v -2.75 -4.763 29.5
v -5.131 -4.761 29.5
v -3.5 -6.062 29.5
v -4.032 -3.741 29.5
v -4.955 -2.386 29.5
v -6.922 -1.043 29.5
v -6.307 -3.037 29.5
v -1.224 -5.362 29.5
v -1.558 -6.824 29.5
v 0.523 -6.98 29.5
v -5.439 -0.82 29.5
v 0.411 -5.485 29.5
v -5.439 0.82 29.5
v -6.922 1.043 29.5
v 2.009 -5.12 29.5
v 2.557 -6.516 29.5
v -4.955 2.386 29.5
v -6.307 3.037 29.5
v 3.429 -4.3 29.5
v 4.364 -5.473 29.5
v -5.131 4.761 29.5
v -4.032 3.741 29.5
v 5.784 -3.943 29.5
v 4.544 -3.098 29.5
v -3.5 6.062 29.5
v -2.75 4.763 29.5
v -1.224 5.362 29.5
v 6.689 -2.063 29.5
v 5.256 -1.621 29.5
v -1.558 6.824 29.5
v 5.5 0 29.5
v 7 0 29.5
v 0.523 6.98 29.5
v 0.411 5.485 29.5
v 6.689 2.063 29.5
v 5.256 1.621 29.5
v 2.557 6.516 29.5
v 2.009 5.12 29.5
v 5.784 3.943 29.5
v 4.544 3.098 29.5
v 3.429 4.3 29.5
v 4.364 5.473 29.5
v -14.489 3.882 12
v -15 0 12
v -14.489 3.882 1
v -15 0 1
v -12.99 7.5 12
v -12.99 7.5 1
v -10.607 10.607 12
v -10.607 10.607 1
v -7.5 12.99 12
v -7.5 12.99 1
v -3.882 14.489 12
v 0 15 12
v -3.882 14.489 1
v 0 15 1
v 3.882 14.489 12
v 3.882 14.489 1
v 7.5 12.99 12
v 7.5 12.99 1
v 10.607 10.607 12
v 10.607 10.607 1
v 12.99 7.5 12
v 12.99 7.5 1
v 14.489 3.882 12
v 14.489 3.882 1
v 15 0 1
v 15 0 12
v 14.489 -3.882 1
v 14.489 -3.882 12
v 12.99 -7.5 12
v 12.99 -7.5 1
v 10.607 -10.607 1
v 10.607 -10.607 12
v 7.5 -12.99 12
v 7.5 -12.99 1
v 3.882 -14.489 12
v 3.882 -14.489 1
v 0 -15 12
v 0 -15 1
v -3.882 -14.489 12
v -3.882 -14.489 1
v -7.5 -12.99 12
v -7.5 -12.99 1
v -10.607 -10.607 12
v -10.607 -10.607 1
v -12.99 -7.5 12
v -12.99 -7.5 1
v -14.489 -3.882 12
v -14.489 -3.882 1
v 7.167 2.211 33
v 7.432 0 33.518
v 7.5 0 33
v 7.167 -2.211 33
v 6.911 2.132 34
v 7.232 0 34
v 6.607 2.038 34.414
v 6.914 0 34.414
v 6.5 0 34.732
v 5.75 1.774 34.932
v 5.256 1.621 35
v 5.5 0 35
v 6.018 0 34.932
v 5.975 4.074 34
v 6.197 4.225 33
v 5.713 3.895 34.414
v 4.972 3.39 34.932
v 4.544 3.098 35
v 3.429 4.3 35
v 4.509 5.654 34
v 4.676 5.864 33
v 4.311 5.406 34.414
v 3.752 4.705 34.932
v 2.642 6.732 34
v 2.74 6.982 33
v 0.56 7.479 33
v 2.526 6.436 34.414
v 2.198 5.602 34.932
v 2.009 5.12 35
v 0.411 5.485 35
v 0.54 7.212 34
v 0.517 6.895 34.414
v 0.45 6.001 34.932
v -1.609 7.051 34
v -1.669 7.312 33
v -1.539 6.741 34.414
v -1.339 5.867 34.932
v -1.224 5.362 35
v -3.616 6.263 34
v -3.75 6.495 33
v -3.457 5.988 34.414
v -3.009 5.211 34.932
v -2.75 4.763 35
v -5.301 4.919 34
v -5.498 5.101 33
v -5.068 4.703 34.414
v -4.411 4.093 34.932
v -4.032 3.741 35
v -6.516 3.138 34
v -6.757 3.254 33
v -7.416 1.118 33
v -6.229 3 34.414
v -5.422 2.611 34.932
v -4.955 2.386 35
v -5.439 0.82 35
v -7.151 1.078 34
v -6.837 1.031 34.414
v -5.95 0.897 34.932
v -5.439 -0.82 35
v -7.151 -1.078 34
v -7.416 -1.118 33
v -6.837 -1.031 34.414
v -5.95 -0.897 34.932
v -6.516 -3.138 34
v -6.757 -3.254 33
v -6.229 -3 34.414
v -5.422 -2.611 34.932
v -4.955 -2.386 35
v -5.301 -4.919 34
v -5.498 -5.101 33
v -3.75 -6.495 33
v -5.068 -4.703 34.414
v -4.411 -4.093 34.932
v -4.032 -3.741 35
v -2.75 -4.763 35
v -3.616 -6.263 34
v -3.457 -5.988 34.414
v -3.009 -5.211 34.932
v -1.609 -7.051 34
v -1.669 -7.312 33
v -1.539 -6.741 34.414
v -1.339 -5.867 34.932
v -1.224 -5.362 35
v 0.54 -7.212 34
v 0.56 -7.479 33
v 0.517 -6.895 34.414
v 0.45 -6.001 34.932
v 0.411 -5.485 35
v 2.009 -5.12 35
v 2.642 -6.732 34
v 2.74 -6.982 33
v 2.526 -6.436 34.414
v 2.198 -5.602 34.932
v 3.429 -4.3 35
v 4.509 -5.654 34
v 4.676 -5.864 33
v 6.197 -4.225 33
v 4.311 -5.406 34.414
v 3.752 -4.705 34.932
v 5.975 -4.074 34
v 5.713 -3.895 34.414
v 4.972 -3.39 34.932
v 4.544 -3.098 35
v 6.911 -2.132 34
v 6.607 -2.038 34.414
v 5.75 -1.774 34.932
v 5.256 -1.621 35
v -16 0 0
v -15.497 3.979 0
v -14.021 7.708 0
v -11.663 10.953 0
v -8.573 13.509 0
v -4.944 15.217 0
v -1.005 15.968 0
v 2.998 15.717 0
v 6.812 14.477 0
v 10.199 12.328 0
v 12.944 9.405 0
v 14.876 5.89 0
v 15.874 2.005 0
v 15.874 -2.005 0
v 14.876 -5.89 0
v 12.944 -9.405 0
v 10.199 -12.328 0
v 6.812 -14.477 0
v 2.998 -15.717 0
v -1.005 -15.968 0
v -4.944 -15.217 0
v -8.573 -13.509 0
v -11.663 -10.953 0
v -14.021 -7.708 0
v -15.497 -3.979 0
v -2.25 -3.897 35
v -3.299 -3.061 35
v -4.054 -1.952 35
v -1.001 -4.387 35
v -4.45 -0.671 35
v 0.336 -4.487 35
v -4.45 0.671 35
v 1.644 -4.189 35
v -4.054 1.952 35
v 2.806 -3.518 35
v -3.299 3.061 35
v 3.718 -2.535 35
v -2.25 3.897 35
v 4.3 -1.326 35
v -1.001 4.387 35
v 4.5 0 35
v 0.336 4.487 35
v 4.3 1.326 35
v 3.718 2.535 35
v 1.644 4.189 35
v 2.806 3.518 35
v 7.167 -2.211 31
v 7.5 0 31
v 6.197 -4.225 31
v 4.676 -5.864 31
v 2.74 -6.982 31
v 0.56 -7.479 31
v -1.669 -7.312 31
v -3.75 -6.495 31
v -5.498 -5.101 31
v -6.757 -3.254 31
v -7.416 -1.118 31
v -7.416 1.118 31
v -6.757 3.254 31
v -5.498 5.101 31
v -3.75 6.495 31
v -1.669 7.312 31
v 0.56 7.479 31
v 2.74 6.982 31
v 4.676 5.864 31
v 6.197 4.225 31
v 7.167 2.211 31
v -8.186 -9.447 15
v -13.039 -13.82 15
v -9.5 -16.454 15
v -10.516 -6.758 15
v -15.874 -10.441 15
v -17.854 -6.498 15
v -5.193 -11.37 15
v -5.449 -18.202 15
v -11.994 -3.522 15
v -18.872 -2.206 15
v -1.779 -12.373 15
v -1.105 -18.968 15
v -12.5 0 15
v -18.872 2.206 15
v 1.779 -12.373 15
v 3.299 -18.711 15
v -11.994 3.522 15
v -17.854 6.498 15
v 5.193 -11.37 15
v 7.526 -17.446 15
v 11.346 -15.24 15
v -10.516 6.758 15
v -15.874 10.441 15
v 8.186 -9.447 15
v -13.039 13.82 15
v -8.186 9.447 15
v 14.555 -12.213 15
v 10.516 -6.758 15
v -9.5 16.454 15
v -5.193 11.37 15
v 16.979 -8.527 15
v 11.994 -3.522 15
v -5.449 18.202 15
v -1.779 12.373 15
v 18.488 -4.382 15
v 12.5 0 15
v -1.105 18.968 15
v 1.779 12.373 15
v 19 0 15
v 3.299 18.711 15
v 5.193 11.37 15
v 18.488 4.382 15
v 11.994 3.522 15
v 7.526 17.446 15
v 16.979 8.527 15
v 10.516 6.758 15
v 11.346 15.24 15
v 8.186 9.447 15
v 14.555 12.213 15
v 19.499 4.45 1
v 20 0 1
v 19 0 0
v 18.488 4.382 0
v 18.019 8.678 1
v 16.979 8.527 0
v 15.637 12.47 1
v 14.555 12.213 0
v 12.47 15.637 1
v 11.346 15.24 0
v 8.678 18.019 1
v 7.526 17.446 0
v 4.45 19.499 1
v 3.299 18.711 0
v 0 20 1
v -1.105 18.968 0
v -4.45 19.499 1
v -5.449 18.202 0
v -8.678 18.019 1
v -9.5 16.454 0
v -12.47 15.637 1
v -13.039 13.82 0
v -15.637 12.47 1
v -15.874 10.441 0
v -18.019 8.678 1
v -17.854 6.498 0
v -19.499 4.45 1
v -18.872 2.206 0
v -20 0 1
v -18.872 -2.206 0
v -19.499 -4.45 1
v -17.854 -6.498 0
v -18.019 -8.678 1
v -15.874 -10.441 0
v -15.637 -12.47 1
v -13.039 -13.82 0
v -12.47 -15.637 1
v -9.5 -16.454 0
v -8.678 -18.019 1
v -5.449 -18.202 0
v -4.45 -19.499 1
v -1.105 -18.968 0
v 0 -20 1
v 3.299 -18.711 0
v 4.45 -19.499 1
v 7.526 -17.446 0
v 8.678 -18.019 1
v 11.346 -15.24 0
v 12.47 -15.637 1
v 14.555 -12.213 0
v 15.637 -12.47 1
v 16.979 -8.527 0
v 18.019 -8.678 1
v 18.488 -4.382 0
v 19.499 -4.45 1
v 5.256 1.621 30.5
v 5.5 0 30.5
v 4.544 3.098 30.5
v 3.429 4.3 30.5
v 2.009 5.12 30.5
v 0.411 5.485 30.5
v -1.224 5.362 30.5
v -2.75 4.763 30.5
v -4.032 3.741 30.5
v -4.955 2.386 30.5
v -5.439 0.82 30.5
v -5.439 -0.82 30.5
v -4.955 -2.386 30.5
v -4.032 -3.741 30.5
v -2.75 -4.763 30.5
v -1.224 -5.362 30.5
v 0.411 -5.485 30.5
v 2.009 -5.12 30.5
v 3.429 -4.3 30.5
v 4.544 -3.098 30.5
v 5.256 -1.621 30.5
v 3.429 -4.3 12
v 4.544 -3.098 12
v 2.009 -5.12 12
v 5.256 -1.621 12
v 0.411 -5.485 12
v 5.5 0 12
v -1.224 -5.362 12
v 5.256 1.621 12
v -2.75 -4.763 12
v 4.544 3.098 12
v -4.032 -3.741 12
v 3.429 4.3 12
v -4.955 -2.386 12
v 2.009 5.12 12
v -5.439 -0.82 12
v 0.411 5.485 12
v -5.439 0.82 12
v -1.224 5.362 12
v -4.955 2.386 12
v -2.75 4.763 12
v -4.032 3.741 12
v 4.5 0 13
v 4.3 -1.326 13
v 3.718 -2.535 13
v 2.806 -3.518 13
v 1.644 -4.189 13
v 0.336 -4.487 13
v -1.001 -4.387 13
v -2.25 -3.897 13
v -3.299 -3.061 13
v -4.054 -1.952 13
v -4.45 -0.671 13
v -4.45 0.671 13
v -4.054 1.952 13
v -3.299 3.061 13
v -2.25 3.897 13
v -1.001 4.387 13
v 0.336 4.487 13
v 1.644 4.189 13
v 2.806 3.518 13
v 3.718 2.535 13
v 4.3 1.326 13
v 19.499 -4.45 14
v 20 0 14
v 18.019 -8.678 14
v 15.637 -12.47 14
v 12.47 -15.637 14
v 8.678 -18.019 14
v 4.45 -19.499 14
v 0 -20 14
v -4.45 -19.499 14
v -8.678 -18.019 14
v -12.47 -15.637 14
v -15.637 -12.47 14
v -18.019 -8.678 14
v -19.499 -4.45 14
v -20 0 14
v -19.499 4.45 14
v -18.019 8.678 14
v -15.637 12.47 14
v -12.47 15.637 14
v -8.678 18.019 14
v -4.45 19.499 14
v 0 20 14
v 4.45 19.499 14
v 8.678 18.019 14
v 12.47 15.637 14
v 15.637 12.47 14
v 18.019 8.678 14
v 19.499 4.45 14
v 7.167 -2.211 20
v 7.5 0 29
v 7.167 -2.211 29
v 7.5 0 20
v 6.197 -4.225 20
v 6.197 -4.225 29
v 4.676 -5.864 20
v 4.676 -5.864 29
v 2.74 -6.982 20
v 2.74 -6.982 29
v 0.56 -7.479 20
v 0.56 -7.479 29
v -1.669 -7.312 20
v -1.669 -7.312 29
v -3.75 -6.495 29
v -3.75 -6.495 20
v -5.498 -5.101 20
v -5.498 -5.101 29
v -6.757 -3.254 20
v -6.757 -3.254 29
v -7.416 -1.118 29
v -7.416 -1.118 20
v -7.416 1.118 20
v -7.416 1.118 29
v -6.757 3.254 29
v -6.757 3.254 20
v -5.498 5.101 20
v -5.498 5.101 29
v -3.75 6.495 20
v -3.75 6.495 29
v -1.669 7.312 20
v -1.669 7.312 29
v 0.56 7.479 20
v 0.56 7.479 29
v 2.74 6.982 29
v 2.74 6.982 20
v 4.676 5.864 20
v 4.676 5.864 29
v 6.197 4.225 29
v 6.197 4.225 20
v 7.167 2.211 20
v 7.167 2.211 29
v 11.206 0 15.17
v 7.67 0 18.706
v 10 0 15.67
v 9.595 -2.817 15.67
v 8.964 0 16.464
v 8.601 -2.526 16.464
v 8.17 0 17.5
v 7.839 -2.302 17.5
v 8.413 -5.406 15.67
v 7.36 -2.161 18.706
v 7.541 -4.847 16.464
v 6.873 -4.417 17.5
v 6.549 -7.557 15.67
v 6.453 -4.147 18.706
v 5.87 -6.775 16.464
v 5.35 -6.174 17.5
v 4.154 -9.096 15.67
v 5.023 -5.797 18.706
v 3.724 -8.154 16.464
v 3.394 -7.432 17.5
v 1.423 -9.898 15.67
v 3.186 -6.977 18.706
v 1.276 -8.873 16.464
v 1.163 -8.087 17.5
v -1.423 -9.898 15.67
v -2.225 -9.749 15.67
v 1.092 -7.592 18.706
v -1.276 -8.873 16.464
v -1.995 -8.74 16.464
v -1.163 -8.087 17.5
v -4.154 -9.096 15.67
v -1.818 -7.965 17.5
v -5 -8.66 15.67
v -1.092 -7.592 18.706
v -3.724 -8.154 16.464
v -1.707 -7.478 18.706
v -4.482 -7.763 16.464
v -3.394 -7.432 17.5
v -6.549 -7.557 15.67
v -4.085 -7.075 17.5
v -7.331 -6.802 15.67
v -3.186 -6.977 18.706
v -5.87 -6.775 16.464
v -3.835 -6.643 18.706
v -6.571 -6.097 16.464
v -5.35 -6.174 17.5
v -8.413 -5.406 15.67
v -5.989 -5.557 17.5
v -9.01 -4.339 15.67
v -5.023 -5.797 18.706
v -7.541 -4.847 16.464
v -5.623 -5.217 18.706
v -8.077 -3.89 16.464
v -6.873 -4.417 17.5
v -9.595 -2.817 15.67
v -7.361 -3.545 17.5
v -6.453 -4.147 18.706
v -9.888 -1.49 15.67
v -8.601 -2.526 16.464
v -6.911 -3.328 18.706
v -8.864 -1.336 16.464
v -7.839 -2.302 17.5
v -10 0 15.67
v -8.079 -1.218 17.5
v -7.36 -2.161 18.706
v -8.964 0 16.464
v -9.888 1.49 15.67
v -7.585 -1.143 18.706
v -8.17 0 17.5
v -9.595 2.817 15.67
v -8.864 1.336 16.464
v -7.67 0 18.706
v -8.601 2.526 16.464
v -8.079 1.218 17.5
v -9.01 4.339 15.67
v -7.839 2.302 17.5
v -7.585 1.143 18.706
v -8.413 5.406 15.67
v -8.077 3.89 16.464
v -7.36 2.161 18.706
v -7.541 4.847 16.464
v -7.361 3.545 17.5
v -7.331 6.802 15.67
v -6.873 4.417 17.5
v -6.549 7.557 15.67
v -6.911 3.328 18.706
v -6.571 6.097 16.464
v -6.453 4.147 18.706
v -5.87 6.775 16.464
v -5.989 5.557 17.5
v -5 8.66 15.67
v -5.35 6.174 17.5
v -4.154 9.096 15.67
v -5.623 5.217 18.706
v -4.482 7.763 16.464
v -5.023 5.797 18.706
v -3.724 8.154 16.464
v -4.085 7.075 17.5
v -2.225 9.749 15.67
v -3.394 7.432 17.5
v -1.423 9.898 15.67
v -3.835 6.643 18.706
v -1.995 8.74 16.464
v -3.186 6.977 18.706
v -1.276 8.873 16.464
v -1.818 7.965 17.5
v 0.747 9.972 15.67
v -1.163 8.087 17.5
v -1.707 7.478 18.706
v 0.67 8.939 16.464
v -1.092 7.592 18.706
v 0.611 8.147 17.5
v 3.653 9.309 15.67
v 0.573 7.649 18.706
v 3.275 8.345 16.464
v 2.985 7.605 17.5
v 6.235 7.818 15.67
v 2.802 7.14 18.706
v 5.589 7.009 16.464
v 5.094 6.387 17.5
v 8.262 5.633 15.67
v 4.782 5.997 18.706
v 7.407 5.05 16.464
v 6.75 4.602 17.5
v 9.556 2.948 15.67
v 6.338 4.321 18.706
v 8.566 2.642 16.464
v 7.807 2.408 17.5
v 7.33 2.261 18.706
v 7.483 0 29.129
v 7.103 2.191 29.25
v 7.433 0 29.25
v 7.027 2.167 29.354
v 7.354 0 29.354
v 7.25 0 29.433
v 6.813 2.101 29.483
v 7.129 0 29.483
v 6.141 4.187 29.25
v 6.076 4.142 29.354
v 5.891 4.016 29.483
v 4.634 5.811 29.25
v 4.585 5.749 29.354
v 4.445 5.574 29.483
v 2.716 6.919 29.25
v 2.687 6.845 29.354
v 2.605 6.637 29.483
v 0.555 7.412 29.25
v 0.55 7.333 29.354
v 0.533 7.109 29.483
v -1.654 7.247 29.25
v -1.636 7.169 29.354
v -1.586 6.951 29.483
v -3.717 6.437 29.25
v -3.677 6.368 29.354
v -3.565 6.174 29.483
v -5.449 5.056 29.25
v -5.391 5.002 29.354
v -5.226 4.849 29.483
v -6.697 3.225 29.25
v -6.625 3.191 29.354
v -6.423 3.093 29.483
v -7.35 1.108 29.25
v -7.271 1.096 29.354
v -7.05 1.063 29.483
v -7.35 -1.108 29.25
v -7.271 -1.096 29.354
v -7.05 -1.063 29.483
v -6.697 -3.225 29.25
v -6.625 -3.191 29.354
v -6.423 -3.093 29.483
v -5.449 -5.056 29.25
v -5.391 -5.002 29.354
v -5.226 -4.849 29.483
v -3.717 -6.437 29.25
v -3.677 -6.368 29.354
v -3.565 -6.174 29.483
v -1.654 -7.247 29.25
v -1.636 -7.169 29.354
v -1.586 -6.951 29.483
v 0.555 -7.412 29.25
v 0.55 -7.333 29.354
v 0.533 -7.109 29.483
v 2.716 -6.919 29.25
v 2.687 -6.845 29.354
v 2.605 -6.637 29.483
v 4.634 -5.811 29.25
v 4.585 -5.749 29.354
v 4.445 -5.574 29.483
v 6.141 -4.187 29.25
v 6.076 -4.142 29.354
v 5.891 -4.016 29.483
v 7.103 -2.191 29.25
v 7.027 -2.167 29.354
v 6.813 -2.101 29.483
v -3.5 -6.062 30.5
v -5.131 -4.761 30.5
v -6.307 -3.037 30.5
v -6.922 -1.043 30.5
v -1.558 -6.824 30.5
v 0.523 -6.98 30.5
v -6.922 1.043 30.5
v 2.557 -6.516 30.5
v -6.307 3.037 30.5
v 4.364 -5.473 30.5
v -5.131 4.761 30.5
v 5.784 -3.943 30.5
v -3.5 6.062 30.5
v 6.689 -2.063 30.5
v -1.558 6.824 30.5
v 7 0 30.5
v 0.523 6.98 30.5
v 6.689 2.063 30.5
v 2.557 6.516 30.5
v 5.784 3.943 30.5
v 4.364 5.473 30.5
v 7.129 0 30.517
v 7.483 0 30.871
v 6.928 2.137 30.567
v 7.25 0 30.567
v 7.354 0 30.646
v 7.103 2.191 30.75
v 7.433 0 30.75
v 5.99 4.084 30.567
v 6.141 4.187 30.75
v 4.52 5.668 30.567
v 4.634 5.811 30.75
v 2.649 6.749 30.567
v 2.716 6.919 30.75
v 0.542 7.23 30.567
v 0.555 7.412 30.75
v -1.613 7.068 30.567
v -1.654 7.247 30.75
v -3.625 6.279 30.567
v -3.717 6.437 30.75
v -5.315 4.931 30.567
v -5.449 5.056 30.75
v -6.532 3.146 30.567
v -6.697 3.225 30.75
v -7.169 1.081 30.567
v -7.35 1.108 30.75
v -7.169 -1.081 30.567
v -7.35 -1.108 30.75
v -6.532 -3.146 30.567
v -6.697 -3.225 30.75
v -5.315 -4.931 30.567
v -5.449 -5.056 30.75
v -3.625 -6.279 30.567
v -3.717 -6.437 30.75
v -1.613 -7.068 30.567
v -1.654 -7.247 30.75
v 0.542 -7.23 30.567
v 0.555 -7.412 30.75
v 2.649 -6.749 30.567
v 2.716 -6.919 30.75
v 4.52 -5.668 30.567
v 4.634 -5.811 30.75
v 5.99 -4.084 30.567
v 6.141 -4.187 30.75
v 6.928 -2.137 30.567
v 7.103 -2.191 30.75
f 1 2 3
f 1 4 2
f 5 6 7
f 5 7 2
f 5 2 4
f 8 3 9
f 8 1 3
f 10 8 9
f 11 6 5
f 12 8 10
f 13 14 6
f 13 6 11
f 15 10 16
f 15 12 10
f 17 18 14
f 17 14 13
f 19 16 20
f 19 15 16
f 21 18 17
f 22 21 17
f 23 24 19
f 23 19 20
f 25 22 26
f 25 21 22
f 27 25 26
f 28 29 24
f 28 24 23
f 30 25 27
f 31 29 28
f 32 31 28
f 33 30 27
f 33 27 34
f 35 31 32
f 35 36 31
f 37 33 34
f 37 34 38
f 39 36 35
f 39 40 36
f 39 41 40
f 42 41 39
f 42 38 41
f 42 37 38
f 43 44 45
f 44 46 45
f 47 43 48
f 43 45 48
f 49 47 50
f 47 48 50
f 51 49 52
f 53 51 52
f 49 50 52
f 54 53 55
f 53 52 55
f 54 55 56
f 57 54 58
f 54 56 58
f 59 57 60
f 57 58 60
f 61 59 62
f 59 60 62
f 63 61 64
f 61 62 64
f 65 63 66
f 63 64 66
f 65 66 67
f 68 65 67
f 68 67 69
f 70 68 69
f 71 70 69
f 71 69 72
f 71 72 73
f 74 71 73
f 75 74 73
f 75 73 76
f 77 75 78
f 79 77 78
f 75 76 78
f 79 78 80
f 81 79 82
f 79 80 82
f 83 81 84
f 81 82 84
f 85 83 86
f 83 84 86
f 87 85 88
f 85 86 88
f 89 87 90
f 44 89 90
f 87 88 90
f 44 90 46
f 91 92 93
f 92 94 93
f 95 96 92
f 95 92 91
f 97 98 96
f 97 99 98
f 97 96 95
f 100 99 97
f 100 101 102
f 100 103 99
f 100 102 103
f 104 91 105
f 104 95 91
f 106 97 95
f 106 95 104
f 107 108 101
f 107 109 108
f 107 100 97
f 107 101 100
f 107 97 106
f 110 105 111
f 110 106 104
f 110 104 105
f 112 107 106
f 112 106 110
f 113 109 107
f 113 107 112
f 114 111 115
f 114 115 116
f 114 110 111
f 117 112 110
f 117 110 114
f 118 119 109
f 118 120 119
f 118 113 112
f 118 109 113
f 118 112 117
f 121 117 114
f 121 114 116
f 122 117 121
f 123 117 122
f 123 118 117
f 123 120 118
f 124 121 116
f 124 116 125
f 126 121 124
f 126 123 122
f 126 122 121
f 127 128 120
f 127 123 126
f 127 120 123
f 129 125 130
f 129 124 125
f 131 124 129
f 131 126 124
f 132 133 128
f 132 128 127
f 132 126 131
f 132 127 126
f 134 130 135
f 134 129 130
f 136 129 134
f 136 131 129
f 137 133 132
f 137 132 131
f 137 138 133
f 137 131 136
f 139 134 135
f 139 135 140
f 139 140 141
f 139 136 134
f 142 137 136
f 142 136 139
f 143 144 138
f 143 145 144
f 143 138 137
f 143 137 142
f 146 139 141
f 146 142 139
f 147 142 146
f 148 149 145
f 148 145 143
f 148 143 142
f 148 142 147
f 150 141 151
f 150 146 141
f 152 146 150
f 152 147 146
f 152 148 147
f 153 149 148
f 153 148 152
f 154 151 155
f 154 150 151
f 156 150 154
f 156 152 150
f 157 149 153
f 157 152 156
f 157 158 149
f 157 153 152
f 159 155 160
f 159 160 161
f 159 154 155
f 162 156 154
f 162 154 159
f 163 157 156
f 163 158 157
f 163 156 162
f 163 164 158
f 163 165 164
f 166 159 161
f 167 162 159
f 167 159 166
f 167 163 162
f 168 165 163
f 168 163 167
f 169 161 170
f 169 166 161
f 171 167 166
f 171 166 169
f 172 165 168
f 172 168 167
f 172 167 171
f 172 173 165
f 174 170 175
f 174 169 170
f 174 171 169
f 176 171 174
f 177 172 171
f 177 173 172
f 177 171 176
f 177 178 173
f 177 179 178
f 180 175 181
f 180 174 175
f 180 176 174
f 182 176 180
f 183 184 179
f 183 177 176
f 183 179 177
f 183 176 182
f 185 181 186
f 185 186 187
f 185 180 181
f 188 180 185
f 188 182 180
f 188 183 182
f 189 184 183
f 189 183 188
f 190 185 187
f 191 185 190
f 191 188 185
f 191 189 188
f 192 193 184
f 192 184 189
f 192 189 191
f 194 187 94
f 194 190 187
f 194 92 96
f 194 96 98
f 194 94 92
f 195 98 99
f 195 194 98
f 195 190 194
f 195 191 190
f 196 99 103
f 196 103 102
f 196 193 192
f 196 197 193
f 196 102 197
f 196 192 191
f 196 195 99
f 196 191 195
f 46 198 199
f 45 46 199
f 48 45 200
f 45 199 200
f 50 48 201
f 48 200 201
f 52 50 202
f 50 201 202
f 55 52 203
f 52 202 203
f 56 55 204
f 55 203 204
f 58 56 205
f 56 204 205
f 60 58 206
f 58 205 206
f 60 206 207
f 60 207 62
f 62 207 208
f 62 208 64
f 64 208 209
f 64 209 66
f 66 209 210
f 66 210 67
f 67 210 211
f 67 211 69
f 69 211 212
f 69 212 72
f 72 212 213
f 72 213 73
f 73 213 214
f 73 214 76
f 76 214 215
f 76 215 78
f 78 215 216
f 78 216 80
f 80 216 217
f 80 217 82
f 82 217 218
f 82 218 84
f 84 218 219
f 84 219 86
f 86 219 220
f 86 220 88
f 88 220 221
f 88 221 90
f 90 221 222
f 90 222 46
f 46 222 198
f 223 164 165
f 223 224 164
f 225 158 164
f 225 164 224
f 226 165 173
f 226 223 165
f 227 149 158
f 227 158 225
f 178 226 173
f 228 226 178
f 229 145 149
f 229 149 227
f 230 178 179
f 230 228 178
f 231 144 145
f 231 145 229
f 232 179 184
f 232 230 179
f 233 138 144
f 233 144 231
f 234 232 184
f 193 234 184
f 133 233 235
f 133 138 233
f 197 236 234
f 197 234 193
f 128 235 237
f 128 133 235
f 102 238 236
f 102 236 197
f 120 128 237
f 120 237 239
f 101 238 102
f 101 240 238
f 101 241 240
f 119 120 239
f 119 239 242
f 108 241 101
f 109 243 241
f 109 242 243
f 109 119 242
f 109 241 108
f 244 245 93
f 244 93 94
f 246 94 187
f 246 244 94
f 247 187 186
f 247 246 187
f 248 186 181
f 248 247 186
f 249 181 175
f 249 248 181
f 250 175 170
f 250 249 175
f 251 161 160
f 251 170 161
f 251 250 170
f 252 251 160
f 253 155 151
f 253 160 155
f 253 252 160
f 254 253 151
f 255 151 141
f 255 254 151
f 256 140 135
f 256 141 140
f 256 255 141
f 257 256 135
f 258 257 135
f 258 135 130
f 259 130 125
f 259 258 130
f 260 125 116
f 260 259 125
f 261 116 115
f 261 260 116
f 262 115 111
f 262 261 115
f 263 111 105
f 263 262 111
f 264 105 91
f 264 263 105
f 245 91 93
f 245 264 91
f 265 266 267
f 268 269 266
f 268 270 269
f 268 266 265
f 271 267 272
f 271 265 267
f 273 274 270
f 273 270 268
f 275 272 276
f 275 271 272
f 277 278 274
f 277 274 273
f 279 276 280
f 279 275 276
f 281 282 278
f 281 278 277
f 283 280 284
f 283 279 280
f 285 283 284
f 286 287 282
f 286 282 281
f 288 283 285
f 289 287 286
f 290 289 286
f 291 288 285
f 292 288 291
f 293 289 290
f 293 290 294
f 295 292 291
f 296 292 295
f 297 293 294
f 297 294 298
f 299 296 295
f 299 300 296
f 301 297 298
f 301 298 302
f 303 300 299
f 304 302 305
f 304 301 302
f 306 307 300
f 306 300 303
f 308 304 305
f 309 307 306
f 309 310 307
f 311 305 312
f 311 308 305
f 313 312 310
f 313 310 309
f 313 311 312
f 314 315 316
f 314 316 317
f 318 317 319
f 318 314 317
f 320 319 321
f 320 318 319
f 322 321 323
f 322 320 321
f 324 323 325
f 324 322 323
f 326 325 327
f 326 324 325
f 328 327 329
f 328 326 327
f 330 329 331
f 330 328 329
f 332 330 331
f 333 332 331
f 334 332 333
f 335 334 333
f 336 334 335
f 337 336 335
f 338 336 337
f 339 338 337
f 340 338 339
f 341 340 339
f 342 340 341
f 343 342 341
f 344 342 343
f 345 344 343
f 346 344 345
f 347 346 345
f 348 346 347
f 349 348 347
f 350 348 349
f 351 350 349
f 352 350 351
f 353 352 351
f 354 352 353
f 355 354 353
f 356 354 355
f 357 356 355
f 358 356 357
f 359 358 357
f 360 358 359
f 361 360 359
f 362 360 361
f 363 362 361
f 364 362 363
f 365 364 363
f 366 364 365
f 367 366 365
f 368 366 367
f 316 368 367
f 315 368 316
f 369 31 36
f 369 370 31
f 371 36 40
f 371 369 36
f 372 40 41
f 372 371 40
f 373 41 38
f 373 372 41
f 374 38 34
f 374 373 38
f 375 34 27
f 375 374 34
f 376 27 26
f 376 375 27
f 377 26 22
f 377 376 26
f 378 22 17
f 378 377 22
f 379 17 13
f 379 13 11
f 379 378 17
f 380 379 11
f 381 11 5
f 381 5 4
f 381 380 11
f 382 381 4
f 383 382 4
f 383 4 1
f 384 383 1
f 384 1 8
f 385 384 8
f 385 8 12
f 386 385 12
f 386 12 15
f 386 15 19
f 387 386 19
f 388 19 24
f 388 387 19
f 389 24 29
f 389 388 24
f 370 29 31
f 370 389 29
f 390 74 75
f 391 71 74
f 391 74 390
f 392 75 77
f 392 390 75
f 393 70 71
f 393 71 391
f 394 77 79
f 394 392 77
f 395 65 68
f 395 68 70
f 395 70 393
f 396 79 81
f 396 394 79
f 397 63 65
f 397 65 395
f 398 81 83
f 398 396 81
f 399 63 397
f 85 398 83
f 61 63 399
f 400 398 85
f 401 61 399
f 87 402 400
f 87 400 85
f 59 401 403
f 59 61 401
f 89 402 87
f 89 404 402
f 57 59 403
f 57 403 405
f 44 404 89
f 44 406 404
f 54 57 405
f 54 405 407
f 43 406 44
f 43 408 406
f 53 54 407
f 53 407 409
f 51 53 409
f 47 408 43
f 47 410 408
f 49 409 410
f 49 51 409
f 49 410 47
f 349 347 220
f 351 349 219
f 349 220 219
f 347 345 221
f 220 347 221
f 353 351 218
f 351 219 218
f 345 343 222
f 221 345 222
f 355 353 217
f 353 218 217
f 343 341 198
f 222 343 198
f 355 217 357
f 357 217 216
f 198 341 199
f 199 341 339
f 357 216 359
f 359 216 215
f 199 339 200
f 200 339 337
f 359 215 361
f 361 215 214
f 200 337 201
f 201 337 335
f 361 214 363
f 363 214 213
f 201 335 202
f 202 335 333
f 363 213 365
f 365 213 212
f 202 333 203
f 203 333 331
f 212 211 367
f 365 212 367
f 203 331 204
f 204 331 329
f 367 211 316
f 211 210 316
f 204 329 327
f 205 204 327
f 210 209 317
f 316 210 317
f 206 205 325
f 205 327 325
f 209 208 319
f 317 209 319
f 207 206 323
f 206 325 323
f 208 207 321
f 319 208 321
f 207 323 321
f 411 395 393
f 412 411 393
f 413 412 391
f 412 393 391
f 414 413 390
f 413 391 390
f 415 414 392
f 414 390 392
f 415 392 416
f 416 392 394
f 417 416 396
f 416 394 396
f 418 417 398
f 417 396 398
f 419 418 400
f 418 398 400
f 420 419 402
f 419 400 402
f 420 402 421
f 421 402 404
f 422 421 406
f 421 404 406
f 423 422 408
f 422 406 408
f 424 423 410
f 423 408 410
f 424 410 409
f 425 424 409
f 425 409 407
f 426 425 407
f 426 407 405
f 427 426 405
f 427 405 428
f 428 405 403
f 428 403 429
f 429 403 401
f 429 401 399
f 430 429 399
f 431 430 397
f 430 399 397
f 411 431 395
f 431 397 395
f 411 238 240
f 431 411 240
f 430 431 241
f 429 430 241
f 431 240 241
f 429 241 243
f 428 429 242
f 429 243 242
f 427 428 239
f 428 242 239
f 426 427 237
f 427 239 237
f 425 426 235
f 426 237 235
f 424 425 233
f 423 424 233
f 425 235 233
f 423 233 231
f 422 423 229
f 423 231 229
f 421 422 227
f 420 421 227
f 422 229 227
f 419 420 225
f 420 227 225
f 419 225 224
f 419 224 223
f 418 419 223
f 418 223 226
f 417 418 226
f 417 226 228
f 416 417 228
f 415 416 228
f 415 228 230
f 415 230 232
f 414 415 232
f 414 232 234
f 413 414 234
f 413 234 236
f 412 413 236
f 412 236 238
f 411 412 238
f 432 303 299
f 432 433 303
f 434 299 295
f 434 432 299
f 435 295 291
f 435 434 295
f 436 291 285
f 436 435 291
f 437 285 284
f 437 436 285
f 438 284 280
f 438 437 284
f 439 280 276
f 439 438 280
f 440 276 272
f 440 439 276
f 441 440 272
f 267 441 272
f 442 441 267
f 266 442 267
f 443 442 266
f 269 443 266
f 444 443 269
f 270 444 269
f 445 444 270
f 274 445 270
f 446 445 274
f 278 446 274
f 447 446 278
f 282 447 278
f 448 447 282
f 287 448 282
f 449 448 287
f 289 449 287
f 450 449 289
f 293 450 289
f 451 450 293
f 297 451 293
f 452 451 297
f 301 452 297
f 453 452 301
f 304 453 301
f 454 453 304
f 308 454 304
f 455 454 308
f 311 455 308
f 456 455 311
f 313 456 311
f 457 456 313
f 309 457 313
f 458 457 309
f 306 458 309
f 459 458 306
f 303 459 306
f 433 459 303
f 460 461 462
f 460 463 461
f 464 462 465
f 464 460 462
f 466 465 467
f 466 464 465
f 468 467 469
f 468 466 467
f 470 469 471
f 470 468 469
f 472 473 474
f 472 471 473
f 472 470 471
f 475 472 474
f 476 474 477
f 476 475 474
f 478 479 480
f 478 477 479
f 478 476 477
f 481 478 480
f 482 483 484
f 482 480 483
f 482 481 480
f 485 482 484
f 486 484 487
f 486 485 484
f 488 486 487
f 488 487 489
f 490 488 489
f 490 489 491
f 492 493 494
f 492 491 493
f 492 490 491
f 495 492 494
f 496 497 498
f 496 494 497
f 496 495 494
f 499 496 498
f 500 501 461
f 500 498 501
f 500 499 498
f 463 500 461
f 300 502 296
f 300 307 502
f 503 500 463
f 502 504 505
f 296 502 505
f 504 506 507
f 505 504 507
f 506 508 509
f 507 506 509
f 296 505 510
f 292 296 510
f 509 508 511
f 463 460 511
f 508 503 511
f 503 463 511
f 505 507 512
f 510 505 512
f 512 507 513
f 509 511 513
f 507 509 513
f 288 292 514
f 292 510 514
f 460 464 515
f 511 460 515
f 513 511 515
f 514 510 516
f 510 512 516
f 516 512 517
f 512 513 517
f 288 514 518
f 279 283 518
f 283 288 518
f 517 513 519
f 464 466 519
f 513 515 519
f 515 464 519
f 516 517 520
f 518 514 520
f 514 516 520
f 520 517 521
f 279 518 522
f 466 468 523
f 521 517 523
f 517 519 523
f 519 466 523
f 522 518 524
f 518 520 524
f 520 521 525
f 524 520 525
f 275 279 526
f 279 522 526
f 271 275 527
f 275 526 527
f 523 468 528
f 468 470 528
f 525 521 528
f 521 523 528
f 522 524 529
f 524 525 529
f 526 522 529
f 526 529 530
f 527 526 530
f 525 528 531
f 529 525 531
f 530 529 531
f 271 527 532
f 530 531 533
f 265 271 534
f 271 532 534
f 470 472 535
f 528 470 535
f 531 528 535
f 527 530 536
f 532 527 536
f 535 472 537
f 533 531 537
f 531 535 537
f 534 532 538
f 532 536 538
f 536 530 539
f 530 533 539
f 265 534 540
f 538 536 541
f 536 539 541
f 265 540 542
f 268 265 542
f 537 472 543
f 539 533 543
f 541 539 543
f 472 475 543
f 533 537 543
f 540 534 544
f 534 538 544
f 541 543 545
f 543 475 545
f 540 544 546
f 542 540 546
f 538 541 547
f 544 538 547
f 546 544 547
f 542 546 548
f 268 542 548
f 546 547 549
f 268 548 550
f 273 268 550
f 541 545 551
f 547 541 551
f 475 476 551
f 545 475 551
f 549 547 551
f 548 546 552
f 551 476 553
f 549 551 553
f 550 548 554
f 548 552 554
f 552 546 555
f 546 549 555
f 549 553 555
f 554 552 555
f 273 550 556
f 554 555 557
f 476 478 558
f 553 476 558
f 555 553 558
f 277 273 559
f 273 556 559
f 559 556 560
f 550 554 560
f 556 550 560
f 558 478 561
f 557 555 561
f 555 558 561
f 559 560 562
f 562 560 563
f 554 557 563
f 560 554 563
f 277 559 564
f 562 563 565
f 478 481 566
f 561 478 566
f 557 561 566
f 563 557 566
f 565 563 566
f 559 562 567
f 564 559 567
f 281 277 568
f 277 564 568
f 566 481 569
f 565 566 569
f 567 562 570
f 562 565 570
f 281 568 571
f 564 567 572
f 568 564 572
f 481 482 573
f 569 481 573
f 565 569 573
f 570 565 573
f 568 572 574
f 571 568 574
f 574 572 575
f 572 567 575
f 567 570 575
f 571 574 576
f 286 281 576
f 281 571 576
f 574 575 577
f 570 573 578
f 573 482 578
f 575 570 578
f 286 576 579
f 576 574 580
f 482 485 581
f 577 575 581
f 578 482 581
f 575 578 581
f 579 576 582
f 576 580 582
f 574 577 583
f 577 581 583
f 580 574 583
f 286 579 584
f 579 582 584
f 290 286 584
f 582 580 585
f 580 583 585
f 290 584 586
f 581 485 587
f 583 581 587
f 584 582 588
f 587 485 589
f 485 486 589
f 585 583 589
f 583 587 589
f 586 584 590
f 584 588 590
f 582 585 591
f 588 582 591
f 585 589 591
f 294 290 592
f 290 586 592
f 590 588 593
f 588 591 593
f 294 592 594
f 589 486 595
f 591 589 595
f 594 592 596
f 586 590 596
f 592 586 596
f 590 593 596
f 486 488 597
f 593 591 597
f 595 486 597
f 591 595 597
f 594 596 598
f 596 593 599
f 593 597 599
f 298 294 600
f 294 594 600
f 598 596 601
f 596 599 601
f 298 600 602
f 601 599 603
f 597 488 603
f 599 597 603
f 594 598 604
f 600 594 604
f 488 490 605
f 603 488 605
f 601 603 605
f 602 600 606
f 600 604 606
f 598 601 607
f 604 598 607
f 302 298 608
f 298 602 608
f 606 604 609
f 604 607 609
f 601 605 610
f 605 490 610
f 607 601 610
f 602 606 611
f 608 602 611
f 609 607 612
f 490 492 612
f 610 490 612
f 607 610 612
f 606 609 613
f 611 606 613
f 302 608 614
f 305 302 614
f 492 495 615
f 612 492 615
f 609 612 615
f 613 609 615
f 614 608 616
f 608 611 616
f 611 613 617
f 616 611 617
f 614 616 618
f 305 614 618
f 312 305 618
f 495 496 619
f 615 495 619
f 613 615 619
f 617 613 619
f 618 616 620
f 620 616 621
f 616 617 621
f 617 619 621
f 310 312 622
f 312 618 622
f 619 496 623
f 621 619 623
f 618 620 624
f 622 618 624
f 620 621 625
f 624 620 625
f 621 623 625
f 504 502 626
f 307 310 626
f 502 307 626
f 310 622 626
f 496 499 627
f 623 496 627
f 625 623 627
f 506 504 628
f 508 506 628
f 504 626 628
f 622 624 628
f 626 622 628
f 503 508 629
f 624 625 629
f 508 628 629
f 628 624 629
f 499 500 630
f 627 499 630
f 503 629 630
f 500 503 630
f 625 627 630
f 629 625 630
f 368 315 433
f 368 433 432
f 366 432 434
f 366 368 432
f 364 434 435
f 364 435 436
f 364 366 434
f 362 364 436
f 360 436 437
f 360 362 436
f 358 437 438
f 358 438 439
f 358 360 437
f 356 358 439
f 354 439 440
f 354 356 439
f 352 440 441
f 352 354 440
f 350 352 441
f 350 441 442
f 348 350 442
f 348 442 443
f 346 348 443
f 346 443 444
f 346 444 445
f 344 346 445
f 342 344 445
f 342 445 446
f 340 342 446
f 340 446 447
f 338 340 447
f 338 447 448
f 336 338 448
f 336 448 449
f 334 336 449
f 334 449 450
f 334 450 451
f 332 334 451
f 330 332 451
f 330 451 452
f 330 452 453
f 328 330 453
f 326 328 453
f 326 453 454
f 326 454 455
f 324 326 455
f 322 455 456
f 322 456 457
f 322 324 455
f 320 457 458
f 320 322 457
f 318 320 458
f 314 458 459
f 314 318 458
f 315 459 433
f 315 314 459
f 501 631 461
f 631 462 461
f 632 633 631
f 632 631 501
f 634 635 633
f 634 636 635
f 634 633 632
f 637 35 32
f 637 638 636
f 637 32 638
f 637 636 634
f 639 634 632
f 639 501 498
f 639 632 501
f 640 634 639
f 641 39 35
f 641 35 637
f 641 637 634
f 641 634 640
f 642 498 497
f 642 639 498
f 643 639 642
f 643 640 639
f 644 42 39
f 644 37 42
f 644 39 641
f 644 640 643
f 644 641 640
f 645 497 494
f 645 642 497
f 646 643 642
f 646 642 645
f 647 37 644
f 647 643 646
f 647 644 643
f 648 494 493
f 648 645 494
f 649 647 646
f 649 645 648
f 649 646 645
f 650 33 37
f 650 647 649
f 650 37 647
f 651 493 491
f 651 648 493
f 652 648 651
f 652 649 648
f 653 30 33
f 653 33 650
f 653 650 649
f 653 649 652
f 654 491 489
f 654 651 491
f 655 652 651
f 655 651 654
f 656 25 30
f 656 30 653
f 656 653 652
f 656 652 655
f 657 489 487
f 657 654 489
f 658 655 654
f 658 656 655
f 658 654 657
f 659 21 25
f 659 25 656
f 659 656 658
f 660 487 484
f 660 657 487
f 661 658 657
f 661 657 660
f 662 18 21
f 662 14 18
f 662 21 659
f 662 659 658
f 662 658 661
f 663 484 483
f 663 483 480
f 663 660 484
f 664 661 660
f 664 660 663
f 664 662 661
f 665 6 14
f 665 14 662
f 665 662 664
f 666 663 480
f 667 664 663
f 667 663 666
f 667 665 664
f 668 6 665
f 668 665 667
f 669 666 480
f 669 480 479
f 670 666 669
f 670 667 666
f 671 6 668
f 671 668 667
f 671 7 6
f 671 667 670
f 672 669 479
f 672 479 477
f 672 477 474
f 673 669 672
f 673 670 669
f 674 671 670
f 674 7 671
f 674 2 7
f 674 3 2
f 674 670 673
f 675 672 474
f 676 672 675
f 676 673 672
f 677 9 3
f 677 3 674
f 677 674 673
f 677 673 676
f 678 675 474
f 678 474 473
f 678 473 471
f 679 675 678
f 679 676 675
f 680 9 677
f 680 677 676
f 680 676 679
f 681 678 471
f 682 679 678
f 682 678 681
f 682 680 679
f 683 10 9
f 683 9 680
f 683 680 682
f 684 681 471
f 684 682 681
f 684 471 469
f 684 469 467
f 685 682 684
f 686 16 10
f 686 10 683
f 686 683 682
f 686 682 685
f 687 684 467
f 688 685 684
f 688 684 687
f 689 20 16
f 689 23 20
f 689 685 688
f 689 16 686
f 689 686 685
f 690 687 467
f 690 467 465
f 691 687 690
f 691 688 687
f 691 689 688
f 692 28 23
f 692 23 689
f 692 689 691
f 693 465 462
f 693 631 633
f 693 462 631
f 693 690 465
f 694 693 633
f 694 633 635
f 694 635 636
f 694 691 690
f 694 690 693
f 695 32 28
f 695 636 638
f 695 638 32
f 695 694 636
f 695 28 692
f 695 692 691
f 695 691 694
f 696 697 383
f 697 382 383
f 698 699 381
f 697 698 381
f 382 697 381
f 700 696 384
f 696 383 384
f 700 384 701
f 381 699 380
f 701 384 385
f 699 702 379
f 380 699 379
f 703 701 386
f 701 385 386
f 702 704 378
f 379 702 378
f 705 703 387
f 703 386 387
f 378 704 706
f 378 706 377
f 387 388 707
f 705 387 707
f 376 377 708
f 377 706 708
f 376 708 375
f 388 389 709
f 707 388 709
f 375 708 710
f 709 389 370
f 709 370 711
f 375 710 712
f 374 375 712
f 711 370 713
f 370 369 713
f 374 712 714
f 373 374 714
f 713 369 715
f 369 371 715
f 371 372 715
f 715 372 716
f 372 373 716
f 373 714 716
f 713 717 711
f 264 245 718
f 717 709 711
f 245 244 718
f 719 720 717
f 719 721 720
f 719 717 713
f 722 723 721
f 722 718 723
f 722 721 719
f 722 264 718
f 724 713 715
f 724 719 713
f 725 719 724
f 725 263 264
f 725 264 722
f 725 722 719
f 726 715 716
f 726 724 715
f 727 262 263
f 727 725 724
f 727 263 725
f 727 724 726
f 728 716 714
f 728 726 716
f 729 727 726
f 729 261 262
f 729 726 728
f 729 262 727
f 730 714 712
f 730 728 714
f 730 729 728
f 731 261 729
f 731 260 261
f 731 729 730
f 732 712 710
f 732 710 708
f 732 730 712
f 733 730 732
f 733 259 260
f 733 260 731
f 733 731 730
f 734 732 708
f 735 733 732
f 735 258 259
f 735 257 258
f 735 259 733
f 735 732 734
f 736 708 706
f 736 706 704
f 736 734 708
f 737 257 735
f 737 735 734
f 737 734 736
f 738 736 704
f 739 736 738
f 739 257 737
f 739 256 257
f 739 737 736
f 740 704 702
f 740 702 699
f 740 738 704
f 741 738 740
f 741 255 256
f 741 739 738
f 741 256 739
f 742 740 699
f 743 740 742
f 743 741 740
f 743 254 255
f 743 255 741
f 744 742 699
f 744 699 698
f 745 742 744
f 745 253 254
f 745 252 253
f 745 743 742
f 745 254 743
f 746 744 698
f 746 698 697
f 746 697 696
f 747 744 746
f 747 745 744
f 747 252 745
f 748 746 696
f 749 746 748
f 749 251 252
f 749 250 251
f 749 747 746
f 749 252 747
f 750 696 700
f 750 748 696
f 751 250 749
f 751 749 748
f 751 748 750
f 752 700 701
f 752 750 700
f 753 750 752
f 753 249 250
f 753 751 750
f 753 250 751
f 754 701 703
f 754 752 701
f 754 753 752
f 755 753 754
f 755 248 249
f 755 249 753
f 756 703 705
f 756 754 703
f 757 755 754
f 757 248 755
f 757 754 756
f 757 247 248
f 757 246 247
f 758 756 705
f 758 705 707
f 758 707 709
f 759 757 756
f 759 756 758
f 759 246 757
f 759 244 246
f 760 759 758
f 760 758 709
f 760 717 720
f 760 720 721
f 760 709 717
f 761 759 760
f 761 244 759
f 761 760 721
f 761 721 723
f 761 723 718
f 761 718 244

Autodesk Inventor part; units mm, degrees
ref_plane "YZ Plane" through (0, 0, 0) normal (1, 0, 0) x (0, 1, 0)
ref_plane "XZ Plane" through (0, 0, 0) normal (0, 1, 0) x (-1, 0, 0)
sketch "Skizze1" plane through (0, 0, 0) normal (0, 0, 1) x (1, 0, 0)
  line L0 (-28, 0) -> (28, 0) projected
  line L1 (0, -28) -> (0, 28) projected
  circle A0 centre (0, 0) radius 20
  dimension "d0" = 40
extrude "Extrusion1" add sketch "Skizze1" along normal blind 15
sketch "Skizze2" plane through (0, 0, 15) normal (0, 0, 1) x (1, 0, 0)
  circle A0 centre (0, 0) radius 7.5
  dimension "d3" = 15
extrude "Extrusion2" add sketch "Skizze2" along normal blind 20
fillet "Rundung1" radius 5 1 edges at (-7.5, 0, 15)
chamfer "Fase1" distance 1 angle 45 2 edges at (-20, 0, 15) (-20, 0, 0)
fillet "Rundung2" radius 2 1 edges at (-7.5, 0, 35)
ref_plane "Arbeitsebene1" through (0, 0, 30) normal (0, 0, 1) x (1, 0, 0)
sketch "Skizze4" plane through (0, 0, 30) normal (0, 0, 1) x (1, 0, 0)
  circle A0 centre (0, 0) radius 5.5
  circle A1 centre (0, 0) radius 7.5
extrude "Extrusion3" cut sketch "Skizze4" along normal mid plane 1
fillet "Rundung3" radius 0.5 2 edges at (-7.5, 0, 30.5) (-7.5, 0, 29.5)
sketch "Skizze5" plane through (0, 0, 35) normal (0, 0, 1) x (1, 0, 0)
  circle A0 centre (0, 0) radius 4.5
  dimension "d15" = 9
extrude "Extrusion4" cut sketch "Skizze5" against normal blind 40
sketch "Skizze6" plane through (0, 0, 0) normal (0, 0, -1) x (-1, 0, 0)
  circle A0 centre (0, 0) radius 15
  dimension "d18" = 30
extrude "Extrusion5" cut sketch "Skizze6" against normal blind 12
thread "Gewinde1" size "M30x3.5" class "6H" standard "ISO Metric profile" length 15
chamfer "Fase2" distance 1 angle 45 1 edges at (15, 0, 0)
chamfer "Fase3" distance 1 angle 45 1 edges at (-4.5, 0, 12)
properties part number "SchlauchAnschluss"
